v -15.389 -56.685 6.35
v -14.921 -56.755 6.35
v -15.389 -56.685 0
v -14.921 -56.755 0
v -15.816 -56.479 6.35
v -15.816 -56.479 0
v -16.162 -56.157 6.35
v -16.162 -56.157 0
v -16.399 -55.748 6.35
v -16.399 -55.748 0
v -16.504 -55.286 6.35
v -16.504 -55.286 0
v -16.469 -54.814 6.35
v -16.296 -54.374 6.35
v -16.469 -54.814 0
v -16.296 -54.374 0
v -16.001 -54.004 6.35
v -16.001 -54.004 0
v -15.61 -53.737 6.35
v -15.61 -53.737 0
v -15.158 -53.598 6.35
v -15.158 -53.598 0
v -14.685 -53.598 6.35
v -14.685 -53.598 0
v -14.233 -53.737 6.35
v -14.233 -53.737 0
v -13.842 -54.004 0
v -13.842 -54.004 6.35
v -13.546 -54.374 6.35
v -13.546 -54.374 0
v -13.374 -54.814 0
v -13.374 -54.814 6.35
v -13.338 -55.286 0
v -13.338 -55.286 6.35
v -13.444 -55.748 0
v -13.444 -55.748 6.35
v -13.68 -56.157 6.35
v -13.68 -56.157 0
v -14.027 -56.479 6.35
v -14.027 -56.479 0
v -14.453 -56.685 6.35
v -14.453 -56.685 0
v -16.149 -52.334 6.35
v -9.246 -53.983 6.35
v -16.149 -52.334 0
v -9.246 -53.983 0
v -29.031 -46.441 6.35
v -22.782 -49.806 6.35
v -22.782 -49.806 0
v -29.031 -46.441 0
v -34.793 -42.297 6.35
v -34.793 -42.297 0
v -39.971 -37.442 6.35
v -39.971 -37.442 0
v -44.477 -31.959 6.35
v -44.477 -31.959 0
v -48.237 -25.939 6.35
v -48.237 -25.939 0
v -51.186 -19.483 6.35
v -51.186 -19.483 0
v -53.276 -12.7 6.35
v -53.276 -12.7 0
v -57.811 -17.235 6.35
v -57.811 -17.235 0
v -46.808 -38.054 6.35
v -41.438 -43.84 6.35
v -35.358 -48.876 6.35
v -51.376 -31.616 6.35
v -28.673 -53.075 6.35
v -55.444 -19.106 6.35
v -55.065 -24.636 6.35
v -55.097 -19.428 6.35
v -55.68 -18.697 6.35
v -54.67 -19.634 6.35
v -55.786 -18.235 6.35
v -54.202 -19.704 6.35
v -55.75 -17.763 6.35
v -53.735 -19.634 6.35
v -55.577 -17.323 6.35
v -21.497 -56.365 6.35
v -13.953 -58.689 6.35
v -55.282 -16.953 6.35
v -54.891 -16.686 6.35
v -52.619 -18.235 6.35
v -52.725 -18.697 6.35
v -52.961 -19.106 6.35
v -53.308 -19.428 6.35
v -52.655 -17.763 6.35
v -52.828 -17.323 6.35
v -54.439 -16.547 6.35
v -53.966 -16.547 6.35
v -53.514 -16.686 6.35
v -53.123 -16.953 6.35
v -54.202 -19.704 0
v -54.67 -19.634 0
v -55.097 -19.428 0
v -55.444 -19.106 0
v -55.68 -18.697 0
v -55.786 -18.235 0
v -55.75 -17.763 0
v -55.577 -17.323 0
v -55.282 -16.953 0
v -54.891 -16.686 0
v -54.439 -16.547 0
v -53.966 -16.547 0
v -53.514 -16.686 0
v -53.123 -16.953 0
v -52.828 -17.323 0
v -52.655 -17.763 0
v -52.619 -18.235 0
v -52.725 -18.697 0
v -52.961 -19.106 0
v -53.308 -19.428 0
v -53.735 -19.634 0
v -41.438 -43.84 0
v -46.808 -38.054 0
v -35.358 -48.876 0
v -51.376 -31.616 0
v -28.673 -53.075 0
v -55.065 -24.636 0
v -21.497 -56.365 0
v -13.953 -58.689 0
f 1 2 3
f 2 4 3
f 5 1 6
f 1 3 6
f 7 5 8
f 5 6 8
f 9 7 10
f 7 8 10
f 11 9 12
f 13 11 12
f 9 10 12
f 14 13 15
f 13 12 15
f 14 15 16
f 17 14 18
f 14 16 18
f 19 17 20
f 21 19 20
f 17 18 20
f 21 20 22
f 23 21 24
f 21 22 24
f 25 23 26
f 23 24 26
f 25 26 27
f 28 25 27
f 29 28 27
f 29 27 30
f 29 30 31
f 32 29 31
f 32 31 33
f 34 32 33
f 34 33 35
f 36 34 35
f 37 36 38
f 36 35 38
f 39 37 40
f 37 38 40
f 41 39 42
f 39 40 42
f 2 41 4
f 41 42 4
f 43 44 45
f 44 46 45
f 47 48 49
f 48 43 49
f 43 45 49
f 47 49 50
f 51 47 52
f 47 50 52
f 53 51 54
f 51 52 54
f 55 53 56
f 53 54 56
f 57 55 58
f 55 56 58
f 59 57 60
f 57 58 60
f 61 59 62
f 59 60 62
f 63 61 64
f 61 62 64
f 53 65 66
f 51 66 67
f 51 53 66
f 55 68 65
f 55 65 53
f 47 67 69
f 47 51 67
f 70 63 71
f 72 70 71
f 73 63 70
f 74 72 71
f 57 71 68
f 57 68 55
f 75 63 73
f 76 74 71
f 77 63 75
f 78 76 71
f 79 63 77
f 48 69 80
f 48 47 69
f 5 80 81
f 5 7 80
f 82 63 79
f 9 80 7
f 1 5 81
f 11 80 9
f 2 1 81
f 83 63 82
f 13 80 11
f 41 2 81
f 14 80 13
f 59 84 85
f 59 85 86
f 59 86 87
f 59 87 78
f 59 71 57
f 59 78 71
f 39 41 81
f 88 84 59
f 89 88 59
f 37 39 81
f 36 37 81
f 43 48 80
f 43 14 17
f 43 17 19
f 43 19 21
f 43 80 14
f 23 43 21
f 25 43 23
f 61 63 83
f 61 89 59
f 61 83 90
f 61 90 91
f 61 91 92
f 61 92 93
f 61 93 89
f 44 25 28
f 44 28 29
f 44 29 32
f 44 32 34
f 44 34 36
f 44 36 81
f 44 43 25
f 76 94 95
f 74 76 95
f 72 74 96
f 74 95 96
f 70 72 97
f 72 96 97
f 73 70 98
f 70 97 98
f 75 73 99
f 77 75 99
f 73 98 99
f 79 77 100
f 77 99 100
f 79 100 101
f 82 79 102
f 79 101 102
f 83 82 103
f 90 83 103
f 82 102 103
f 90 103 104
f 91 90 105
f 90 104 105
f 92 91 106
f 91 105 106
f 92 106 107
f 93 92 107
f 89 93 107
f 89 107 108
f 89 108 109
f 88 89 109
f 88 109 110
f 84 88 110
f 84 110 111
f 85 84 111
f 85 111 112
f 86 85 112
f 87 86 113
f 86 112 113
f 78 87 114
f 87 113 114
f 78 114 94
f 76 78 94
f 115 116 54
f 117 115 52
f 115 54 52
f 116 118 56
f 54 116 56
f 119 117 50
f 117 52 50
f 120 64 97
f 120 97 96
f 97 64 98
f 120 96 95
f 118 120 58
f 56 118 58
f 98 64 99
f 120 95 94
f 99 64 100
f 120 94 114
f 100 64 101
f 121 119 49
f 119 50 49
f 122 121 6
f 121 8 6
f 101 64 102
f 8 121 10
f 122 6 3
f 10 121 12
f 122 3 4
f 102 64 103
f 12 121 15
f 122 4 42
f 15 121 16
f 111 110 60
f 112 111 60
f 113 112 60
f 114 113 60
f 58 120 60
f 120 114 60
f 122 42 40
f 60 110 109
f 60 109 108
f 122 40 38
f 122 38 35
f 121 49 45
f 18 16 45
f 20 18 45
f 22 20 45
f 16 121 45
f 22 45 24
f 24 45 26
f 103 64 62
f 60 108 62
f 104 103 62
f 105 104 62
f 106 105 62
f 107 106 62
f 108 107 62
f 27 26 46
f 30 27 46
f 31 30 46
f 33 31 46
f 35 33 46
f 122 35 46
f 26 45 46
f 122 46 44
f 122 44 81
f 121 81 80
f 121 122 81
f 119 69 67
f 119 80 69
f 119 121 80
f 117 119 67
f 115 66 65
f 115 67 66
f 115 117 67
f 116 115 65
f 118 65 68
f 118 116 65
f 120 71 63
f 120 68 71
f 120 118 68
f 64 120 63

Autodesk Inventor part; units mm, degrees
ref_plane "YZ Plane" through (0, 0, 0) normal (1, 0, 0) x (0, 1, 0)
ref_plane "XZ Plane" through (0, 0, 0) normal (0, 1, 0) x (-1, 0, 0)
ref_plane "XY Plane" through (0, 0, 0) normal (0, 0, 1) x (1, 0, 0)
sketch "Sketch1" plane through (0, 0, 0) normal (0, 0, 1) x (1, 0, 0)
  line L0 (-86.8355, 0) -> (77.4434, 0) projected
  line L1 (0, -88.2763) -> (0, 77.6836) projected
  circle A0 centre (0, 0) radius 53.975 construction
  line L2 (-53.2759, -12.7) -> (-57.8106, -17.2347)
  line L3 (-9.2461, -53.9826) -> (-13.9527, -58.6892)
  arc A1 (-53.2759, -12.7) -> (-9.2461, -53.9826) centre (0, 0) ccw
  arc A2 (-57.8106, -17.2347) -> (-13.9527, -58.6892) centre (0, 0) ccw
  point P0 (-54.2025, -18.1167)
  point P1 (-14.9213, -55.1677)
  dimension "d16" = 107.95
  dimension "d17" = 60.325
  dimension "d18" = 5.5563
  dimension "d19" = 0.7937
  dimension "d20" = 3.175
  dimension "d21" = 3.175
  dimension "d22" = 57.15
  dimension "d23" = 57.15
  dimension "d24" = 45
  dimension "d25" = 12.7
extrude "Extrusion1" add sketch "Sketch1" along normal blind 6.35
sketch "Sketch2" plane through (0, 0, 6.35) normal (0, 0, 1) x (1, 0, 0)
  circle A0 centre (0, 0) radius 53.975 construction
  arc A1 (-57.8106, -17.2347) -> (-13.9527, -58.6892) centre (0, 0) ccw projected
  line L0 (-57.8106, -17.2347) -> (-53.2759, -12.7) projected
  arc A2 (-53.2759, -12.7) -> (-9.2461, -53.9826) centre (0, 0) ccw projected
  line L1 (-9.2461, -53.9826) -> (-13.9527, -58.6892) projected
  line L2 (0, -88.9565) -> (0, 77.7969) projected
  line L3 (-87.5032, 0) -> (77.5547, 0) projected
  point P0 (-14.9213, -55.1677)
  point P1 (-54.2025, -18.1167)
  dimension "d27" = 107.95
  dimension "d33" = 57.15
  dimension "d34" = 57.15
  dimension "d37" = 3.175
  dimension "d38" = 3.175
hole "Hole1" at (-54.2025, -18.1167, 6.35) at (-14.9213, -55.1677, 6.35) direction (0, 0, -1) diameter 3.175 end through all
properties part number "motor stay bottom"
